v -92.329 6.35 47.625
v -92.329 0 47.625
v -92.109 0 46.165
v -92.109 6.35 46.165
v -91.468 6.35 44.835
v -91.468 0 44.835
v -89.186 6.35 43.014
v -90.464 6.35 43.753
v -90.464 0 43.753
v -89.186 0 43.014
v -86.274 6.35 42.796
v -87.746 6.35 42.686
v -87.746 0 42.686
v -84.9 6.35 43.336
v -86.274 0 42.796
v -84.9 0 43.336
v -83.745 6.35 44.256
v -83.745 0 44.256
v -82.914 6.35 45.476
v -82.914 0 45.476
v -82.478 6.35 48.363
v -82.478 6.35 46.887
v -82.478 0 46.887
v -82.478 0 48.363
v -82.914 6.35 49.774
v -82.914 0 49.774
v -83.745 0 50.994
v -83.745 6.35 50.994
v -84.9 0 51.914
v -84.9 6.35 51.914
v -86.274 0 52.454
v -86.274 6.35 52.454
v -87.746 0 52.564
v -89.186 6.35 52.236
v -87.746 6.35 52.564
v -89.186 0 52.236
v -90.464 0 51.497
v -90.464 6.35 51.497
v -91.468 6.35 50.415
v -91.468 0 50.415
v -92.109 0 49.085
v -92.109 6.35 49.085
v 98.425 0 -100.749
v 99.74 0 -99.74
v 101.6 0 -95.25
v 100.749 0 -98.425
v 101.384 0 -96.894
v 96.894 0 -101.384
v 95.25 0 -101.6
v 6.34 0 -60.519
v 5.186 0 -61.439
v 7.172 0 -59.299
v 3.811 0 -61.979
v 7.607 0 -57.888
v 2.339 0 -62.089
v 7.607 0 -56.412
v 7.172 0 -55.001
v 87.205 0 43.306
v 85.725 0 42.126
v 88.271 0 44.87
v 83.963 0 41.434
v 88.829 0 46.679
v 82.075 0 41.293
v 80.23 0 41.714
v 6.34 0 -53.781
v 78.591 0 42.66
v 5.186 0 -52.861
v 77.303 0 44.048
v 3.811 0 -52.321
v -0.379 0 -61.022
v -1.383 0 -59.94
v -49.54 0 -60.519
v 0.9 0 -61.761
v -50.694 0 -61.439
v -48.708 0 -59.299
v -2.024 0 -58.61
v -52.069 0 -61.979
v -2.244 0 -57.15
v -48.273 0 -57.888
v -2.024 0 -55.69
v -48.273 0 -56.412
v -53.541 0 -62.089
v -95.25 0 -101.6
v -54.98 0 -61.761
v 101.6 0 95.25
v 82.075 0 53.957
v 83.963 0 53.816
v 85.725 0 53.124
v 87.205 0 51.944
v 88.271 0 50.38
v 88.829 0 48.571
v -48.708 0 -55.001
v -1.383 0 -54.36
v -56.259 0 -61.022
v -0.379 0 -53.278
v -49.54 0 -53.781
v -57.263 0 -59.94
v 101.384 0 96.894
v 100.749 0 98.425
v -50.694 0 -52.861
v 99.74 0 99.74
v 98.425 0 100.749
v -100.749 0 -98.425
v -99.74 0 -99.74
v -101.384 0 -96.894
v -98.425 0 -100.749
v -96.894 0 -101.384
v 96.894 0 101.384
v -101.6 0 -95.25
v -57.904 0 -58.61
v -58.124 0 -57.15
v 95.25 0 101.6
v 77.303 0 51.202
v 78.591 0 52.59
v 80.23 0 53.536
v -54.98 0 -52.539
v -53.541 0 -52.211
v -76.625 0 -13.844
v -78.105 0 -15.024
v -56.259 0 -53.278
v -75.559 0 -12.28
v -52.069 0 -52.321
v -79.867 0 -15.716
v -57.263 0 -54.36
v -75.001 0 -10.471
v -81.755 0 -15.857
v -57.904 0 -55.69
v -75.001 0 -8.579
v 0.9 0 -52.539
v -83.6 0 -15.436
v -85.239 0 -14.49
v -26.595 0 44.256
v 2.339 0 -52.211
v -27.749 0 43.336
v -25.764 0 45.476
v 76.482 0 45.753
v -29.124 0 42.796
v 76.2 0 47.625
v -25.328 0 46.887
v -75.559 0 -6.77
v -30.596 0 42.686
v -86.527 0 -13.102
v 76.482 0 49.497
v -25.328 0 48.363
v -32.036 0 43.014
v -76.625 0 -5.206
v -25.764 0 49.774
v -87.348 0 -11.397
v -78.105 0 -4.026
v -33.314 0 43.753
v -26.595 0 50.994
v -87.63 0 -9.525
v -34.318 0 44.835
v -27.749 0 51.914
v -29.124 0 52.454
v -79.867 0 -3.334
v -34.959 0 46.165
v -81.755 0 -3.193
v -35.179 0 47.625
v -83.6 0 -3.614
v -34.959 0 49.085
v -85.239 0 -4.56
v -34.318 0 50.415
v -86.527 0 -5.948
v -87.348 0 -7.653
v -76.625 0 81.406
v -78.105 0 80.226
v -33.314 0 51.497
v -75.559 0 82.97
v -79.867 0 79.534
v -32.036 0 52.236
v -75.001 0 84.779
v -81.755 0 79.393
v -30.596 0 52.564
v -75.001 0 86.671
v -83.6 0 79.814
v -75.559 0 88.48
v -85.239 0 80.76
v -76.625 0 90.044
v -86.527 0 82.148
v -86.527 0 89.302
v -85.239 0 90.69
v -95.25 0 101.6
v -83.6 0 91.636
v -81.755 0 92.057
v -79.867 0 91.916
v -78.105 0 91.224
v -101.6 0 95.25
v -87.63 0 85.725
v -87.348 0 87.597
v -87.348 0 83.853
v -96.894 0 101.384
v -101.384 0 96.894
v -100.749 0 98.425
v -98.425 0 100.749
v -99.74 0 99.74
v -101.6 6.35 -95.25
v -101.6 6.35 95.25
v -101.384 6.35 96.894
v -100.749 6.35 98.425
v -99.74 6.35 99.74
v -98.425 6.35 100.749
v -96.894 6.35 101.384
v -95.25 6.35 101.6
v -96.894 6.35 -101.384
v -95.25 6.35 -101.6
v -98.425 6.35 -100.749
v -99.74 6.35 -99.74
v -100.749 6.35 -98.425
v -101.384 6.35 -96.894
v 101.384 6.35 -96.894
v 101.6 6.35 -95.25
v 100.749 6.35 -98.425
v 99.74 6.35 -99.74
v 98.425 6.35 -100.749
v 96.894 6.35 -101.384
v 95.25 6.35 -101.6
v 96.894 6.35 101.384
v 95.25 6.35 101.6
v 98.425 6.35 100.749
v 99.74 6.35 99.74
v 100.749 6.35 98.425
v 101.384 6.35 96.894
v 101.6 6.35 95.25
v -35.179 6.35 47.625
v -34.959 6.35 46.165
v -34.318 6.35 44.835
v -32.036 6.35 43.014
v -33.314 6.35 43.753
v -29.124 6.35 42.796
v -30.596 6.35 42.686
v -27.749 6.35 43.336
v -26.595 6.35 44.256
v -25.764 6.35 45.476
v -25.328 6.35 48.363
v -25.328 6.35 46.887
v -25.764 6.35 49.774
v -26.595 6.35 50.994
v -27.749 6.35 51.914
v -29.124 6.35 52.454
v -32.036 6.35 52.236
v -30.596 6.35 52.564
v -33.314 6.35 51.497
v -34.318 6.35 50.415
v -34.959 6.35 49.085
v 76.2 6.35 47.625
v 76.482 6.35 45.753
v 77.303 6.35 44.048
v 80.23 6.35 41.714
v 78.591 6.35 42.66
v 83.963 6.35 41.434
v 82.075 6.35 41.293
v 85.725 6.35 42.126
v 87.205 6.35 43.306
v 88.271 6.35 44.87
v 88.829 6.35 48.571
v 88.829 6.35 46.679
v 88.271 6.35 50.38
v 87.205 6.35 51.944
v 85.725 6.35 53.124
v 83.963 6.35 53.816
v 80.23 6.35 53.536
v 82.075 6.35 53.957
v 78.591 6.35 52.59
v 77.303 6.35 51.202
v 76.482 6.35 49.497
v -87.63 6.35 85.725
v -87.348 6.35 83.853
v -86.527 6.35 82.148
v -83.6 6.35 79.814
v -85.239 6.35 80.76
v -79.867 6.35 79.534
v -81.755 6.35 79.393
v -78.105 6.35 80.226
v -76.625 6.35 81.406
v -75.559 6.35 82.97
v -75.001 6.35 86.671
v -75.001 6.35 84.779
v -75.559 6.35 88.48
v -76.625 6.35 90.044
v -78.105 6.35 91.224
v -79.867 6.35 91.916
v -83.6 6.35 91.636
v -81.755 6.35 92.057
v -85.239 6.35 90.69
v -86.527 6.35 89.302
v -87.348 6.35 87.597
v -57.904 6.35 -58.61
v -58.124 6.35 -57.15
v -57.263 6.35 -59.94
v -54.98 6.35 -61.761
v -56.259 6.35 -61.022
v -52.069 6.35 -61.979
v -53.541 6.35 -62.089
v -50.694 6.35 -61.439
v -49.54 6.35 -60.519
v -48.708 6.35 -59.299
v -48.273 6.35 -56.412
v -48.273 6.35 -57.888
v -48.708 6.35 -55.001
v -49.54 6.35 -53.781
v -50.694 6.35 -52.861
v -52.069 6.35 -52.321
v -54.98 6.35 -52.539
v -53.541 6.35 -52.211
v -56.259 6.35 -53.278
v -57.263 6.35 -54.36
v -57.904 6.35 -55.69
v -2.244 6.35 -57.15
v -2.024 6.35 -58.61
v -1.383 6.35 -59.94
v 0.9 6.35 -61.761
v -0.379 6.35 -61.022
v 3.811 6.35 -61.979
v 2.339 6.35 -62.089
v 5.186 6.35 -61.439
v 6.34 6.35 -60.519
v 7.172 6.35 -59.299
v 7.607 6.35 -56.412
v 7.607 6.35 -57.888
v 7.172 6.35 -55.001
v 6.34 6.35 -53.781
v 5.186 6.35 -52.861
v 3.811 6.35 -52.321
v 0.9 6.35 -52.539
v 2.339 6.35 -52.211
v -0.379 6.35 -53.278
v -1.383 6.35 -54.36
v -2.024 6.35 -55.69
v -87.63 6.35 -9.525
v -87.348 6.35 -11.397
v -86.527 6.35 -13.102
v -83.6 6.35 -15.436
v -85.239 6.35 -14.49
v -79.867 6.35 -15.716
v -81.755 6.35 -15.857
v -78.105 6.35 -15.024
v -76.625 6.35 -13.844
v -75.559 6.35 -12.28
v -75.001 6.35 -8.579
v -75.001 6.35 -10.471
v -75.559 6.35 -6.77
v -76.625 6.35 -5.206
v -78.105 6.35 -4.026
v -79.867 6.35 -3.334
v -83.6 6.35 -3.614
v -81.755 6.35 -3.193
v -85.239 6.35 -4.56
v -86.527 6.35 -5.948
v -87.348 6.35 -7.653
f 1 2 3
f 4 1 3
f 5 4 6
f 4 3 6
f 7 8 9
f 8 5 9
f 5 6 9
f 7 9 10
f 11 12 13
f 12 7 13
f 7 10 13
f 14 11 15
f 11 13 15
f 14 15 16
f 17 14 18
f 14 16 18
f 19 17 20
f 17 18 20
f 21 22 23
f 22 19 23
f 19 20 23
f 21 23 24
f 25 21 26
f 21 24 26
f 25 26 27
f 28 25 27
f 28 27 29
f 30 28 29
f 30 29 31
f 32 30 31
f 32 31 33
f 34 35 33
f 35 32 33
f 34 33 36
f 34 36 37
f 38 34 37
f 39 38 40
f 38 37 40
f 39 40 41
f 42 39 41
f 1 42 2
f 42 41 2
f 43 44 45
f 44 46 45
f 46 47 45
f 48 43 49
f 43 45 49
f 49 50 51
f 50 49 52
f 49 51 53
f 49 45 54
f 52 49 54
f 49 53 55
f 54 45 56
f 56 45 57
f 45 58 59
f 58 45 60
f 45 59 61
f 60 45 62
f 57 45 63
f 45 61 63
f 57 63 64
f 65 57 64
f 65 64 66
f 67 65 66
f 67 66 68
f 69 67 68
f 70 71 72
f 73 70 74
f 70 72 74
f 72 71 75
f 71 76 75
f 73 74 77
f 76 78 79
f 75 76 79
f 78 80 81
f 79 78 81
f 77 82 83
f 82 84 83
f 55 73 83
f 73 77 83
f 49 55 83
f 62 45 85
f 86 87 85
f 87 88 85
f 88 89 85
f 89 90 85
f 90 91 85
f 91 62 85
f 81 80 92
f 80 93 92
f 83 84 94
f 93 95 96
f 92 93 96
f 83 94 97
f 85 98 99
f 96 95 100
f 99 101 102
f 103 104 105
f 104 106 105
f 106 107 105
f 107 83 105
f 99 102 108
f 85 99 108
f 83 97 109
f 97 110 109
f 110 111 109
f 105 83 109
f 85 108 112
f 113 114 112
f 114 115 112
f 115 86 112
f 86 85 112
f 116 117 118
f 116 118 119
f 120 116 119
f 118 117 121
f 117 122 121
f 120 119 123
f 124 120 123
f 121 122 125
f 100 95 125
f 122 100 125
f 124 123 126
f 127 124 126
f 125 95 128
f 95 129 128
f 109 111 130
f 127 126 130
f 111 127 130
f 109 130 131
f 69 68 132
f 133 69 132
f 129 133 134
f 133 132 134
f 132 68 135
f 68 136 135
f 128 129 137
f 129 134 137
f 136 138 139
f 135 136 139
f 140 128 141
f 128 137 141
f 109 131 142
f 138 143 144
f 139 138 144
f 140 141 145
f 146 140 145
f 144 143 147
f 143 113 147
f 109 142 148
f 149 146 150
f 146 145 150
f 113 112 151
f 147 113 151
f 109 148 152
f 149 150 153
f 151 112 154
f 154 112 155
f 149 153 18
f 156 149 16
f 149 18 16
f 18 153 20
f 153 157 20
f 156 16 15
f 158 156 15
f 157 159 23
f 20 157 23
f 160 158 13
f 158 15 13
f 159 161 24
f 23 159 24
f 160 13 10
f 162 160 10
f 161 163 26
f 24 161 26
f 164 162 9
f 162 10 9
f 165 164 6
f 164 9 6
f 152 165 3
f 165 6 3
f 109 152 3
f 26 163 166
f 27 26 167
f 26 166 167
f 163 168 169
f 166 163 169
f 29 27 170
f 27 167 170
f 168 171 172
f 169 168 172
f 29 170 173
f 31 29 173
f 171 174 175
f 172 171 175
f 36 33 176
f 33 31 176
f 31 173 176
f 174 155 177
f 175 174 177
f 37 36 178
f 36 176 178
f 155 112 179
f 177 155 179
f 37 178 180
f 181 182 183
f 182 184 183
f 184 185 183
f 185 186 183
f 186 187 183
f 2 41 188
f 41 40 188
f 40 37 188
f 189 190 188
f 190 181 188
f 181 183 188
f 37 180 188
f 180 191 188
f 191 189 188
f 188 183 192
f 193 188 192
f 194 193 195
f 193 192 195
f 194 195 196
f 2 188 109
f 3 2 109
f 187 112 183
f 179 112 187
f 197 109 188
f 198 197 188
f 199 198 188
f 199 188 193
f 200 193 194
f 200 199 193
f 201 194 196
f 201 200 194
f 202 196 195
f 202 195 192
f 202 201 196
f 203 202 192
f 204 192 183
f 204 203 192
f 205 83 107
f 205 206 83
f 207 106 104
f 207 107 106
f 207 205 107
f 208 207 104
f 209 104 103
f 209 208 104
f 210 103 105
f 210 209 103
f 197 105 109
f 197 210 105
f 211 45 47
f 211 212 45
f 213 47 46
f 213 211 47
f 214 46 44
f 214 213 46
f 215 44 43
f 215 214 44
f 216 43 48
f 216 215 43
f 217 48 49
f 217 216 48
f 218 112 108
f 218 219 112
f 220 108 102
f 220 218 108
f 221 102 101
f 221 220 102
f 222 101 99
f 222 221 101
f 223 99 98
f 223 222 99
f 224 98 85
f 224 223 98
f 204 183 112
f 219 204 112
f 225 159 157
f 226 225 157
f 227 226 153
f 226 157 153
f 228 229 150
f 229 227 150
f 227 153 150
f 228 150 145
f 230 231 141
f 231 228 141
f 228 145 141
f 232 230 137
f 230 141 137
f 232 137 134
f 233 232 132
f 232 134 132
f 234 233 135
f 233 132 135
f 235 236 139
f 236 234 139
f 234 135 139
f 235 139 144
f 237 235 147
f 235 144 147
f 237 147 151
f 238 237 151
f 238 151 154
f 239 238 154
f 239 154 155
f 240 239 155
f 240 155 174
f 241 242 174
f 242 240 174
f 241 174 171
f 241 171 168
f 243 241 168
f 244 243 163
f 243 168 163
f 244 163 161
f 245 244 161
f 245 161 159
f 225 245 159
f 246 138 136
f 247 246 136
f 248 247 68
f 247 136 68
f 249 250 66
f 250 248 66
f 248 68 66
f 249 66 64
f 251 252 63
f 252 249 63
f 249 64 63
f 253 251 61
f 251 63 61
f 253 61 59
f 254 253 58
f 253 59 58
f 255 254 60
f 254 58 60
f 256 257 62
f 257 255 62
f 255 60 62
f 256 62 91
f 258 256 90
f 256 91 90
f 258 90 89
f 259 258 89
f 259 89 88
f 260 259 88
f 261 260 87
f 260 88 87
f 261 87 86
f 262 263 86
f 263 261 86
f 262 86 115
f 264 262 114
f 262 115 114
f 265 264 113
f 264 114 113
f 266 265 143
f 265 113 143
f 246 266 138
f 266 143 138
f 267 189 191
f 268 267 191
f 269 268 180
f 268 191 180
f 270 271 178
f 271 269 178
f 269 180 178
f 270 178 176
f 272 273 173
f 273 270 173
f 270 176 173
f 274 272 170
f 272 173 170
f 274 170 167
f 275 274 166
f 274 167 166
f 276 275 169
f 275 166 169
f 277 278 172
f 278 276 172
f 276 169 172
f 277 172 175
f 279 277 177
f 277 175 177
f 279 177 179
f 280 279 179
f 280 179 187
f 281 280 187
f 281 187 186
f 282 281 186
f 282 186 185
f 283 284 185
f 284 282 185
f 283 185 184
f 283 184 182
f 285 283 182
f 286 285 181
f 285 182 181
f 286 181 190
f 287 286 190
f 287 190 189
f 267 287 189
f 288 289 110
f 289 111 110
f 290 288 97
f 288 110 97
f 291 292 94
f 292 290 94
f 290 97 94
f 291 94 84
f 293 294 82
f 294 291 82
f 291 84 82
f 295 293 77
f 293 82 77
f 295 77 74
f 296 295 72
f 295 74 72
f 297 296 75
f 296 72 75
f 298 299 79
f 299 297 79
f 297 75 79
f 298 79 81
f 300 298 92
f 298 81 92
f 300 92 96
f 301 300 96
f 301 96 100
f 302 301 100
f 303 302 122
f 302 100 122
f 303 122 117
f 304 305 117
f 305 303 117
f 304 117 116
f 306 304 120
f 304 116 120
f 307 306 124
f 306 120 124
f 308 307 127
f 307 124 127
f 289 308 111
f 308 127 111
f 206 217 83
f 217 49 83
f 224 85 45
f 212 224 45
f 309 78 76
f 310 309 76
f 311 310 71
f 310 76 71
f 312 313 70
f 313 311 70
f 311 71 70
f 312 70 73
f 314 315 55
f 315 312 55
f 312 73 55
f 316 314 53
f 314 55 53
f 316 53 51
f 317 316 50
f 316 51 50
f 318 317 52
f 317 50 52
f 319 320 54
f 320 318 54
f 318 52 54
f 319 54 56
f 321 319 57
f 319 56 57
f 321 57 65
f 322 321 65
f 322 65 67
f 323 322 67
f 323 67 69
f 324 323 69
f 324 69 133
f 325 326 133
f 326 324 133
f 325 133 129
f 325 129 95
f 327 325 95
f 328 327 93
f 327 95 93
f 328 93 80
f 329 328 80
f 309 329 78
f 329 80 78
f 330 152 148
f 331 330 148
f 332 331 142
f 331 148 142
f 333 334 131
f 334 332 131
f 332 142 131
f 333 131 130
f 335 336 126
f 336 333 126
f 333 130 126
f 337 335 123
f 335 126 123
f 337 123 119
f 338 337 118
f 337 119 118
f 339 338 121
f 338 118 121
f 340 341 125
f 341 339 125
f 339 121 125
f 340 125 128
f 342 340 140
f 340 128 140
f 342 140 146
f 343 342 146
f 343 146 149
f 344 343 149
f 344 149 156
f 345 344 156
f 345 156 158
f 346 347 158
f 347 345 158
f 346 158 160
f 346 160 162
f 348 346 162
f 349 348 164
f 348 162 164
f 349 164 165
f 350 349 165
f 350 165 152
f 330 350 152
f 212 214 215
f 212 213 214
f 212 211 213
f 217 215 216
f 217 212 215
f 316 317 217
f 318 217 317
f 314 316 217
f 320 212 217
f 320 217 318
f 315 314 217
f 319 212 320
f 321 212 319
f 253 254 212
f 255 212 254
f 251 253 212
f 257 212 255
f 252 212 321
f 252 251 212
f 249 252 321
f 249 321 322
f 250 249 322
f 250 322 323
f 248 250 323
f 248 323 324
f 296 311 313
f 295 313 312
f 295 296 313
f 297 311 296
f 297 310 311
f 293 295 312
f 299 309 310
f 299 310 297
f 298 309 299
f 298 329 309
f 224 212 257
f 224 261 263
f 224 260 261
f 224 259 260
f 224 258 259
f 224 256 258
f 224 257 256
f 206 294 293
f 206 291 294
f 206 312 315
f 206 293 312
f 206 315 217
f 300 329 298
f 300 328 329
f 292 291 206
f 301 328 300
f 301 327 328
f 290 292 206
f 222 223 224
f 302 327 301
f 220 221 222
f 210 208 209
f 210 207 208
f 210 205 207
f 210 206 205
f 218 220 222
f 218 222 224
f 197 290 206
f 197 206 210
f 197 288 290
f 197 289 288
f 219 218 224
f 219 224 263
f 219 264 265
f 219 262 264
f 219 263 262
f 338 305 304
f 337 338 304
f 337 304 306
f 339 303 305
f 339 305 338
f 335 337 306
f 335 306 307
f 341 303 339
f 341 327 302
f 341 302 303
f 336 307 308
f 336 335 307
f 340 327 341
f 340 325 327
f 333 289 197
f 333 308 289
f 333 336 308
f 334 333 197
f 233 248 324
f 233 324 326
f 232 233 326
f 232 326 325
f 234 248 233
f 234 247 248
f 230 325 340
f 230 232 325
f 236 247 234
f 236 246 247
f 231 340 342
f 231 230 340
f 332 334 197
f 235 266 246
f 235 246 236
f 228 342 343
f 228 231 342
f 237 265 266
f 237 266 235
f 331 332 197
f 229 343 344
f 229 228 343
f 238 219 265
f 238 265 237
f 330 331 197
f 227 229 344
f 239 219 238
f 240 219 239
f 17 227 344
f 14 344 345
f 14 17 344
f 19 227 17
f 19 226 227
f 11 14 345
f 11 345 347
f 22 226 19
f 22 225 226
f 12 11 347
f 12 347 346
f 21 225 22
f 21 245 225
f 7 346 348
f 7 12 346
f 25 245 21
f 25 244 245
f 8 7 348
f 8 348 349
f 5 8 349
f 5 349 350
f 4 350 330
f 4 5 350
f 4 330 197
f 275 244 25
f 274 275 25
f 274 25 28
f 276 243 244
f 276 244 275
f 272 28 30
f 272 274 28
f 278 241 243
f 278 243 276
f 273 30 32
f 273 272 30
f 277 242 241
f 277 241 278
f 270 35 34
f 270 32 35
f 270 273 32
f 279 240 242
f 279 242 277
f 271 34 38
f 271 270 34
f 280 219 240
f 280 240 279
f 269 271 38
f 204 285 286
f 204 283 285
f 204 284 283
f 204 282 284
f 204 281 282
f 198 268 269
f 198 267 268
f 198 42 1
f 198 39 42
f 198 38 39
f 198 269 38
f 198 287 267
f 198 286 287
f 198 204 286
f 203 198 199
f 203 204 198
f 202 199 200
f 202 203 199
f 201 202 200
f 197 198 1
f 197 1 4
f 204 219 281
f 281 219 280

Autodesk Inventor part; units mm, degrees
ref_plane "YZ Plane" through (0, 0, 0) normal (1, 0, 0) x (0, 1, 0)
ref_plane "XZ Plane" through (0, 0, 0) normal (0, 1, 0) x (-1, 0, 0)
ref_plane "XY Plane" through (0, 0, 0) normal (0, 0, 1) x (1, 0, 0)
sketch "Sketch1" plane through (0, 0, 0) normal (0, 1, 0) x (-1, 0, 0)
  line L0 (101.6, 101.6) -> (-101.6, 101.6)
  line L1 (-101.6, 101.6) -> (-101.6, -101.6)
  line L2 (-101.6, -101.6) -> (101.6, -101.6)
  line L3 (101.6, -101.6) -> (101.6, 101.6)
  circle A0 centre (81.28, 85.725) radius 6.35
  circle A1 centre (81.28, -9.525) radius 6.35
  circle A2 centre (-82.55, 47.625) radius 6.35
  circle A3 centre (53.1707, -57.15) radius 4.953
  circle A4 centre (-2.7093, -57.15) radius 4.953
  circle A5 centre (87.376, 47.625) radius 4.953
  circle A6 centre (30.226, 47.625) radius 4.953
  point P0 (0, 0)
  dimension "d0" = 203.2
  dimension "d1" = 203.2
  dimension "d2" = 12.7
  dimension "d3" = 15.875
  dimension "d4" = 20.32
  dimension "d6" = 95.25
  dimension "d7" = 12.7
  dimension "d8" = 19.05
  dimension "d9" = 53.975
  dimension "d10" = 9.906
  dimension "d11" = 44.45
  dimension "d12" = 55.88
  dimension "d13" = 9.906
  dimension "d14" = 9.906
  dimension "d15" = 14.224
  dimension "d16" = 9.906
  dimension "d17" = 57.15
extrude "Extrusion1" add sketch "Sketch1" along normal blind 6.35
fillet "Fillet1" radius 6.35 4 edges at (-101.6, 3.175, 101.6) (101.6, 3.175, 101.6) (101.6, 3.175, -101.6) (-101.6, 3.175, -101.6)
properties part number "Nissan_Moter_Mount_Passenger"
